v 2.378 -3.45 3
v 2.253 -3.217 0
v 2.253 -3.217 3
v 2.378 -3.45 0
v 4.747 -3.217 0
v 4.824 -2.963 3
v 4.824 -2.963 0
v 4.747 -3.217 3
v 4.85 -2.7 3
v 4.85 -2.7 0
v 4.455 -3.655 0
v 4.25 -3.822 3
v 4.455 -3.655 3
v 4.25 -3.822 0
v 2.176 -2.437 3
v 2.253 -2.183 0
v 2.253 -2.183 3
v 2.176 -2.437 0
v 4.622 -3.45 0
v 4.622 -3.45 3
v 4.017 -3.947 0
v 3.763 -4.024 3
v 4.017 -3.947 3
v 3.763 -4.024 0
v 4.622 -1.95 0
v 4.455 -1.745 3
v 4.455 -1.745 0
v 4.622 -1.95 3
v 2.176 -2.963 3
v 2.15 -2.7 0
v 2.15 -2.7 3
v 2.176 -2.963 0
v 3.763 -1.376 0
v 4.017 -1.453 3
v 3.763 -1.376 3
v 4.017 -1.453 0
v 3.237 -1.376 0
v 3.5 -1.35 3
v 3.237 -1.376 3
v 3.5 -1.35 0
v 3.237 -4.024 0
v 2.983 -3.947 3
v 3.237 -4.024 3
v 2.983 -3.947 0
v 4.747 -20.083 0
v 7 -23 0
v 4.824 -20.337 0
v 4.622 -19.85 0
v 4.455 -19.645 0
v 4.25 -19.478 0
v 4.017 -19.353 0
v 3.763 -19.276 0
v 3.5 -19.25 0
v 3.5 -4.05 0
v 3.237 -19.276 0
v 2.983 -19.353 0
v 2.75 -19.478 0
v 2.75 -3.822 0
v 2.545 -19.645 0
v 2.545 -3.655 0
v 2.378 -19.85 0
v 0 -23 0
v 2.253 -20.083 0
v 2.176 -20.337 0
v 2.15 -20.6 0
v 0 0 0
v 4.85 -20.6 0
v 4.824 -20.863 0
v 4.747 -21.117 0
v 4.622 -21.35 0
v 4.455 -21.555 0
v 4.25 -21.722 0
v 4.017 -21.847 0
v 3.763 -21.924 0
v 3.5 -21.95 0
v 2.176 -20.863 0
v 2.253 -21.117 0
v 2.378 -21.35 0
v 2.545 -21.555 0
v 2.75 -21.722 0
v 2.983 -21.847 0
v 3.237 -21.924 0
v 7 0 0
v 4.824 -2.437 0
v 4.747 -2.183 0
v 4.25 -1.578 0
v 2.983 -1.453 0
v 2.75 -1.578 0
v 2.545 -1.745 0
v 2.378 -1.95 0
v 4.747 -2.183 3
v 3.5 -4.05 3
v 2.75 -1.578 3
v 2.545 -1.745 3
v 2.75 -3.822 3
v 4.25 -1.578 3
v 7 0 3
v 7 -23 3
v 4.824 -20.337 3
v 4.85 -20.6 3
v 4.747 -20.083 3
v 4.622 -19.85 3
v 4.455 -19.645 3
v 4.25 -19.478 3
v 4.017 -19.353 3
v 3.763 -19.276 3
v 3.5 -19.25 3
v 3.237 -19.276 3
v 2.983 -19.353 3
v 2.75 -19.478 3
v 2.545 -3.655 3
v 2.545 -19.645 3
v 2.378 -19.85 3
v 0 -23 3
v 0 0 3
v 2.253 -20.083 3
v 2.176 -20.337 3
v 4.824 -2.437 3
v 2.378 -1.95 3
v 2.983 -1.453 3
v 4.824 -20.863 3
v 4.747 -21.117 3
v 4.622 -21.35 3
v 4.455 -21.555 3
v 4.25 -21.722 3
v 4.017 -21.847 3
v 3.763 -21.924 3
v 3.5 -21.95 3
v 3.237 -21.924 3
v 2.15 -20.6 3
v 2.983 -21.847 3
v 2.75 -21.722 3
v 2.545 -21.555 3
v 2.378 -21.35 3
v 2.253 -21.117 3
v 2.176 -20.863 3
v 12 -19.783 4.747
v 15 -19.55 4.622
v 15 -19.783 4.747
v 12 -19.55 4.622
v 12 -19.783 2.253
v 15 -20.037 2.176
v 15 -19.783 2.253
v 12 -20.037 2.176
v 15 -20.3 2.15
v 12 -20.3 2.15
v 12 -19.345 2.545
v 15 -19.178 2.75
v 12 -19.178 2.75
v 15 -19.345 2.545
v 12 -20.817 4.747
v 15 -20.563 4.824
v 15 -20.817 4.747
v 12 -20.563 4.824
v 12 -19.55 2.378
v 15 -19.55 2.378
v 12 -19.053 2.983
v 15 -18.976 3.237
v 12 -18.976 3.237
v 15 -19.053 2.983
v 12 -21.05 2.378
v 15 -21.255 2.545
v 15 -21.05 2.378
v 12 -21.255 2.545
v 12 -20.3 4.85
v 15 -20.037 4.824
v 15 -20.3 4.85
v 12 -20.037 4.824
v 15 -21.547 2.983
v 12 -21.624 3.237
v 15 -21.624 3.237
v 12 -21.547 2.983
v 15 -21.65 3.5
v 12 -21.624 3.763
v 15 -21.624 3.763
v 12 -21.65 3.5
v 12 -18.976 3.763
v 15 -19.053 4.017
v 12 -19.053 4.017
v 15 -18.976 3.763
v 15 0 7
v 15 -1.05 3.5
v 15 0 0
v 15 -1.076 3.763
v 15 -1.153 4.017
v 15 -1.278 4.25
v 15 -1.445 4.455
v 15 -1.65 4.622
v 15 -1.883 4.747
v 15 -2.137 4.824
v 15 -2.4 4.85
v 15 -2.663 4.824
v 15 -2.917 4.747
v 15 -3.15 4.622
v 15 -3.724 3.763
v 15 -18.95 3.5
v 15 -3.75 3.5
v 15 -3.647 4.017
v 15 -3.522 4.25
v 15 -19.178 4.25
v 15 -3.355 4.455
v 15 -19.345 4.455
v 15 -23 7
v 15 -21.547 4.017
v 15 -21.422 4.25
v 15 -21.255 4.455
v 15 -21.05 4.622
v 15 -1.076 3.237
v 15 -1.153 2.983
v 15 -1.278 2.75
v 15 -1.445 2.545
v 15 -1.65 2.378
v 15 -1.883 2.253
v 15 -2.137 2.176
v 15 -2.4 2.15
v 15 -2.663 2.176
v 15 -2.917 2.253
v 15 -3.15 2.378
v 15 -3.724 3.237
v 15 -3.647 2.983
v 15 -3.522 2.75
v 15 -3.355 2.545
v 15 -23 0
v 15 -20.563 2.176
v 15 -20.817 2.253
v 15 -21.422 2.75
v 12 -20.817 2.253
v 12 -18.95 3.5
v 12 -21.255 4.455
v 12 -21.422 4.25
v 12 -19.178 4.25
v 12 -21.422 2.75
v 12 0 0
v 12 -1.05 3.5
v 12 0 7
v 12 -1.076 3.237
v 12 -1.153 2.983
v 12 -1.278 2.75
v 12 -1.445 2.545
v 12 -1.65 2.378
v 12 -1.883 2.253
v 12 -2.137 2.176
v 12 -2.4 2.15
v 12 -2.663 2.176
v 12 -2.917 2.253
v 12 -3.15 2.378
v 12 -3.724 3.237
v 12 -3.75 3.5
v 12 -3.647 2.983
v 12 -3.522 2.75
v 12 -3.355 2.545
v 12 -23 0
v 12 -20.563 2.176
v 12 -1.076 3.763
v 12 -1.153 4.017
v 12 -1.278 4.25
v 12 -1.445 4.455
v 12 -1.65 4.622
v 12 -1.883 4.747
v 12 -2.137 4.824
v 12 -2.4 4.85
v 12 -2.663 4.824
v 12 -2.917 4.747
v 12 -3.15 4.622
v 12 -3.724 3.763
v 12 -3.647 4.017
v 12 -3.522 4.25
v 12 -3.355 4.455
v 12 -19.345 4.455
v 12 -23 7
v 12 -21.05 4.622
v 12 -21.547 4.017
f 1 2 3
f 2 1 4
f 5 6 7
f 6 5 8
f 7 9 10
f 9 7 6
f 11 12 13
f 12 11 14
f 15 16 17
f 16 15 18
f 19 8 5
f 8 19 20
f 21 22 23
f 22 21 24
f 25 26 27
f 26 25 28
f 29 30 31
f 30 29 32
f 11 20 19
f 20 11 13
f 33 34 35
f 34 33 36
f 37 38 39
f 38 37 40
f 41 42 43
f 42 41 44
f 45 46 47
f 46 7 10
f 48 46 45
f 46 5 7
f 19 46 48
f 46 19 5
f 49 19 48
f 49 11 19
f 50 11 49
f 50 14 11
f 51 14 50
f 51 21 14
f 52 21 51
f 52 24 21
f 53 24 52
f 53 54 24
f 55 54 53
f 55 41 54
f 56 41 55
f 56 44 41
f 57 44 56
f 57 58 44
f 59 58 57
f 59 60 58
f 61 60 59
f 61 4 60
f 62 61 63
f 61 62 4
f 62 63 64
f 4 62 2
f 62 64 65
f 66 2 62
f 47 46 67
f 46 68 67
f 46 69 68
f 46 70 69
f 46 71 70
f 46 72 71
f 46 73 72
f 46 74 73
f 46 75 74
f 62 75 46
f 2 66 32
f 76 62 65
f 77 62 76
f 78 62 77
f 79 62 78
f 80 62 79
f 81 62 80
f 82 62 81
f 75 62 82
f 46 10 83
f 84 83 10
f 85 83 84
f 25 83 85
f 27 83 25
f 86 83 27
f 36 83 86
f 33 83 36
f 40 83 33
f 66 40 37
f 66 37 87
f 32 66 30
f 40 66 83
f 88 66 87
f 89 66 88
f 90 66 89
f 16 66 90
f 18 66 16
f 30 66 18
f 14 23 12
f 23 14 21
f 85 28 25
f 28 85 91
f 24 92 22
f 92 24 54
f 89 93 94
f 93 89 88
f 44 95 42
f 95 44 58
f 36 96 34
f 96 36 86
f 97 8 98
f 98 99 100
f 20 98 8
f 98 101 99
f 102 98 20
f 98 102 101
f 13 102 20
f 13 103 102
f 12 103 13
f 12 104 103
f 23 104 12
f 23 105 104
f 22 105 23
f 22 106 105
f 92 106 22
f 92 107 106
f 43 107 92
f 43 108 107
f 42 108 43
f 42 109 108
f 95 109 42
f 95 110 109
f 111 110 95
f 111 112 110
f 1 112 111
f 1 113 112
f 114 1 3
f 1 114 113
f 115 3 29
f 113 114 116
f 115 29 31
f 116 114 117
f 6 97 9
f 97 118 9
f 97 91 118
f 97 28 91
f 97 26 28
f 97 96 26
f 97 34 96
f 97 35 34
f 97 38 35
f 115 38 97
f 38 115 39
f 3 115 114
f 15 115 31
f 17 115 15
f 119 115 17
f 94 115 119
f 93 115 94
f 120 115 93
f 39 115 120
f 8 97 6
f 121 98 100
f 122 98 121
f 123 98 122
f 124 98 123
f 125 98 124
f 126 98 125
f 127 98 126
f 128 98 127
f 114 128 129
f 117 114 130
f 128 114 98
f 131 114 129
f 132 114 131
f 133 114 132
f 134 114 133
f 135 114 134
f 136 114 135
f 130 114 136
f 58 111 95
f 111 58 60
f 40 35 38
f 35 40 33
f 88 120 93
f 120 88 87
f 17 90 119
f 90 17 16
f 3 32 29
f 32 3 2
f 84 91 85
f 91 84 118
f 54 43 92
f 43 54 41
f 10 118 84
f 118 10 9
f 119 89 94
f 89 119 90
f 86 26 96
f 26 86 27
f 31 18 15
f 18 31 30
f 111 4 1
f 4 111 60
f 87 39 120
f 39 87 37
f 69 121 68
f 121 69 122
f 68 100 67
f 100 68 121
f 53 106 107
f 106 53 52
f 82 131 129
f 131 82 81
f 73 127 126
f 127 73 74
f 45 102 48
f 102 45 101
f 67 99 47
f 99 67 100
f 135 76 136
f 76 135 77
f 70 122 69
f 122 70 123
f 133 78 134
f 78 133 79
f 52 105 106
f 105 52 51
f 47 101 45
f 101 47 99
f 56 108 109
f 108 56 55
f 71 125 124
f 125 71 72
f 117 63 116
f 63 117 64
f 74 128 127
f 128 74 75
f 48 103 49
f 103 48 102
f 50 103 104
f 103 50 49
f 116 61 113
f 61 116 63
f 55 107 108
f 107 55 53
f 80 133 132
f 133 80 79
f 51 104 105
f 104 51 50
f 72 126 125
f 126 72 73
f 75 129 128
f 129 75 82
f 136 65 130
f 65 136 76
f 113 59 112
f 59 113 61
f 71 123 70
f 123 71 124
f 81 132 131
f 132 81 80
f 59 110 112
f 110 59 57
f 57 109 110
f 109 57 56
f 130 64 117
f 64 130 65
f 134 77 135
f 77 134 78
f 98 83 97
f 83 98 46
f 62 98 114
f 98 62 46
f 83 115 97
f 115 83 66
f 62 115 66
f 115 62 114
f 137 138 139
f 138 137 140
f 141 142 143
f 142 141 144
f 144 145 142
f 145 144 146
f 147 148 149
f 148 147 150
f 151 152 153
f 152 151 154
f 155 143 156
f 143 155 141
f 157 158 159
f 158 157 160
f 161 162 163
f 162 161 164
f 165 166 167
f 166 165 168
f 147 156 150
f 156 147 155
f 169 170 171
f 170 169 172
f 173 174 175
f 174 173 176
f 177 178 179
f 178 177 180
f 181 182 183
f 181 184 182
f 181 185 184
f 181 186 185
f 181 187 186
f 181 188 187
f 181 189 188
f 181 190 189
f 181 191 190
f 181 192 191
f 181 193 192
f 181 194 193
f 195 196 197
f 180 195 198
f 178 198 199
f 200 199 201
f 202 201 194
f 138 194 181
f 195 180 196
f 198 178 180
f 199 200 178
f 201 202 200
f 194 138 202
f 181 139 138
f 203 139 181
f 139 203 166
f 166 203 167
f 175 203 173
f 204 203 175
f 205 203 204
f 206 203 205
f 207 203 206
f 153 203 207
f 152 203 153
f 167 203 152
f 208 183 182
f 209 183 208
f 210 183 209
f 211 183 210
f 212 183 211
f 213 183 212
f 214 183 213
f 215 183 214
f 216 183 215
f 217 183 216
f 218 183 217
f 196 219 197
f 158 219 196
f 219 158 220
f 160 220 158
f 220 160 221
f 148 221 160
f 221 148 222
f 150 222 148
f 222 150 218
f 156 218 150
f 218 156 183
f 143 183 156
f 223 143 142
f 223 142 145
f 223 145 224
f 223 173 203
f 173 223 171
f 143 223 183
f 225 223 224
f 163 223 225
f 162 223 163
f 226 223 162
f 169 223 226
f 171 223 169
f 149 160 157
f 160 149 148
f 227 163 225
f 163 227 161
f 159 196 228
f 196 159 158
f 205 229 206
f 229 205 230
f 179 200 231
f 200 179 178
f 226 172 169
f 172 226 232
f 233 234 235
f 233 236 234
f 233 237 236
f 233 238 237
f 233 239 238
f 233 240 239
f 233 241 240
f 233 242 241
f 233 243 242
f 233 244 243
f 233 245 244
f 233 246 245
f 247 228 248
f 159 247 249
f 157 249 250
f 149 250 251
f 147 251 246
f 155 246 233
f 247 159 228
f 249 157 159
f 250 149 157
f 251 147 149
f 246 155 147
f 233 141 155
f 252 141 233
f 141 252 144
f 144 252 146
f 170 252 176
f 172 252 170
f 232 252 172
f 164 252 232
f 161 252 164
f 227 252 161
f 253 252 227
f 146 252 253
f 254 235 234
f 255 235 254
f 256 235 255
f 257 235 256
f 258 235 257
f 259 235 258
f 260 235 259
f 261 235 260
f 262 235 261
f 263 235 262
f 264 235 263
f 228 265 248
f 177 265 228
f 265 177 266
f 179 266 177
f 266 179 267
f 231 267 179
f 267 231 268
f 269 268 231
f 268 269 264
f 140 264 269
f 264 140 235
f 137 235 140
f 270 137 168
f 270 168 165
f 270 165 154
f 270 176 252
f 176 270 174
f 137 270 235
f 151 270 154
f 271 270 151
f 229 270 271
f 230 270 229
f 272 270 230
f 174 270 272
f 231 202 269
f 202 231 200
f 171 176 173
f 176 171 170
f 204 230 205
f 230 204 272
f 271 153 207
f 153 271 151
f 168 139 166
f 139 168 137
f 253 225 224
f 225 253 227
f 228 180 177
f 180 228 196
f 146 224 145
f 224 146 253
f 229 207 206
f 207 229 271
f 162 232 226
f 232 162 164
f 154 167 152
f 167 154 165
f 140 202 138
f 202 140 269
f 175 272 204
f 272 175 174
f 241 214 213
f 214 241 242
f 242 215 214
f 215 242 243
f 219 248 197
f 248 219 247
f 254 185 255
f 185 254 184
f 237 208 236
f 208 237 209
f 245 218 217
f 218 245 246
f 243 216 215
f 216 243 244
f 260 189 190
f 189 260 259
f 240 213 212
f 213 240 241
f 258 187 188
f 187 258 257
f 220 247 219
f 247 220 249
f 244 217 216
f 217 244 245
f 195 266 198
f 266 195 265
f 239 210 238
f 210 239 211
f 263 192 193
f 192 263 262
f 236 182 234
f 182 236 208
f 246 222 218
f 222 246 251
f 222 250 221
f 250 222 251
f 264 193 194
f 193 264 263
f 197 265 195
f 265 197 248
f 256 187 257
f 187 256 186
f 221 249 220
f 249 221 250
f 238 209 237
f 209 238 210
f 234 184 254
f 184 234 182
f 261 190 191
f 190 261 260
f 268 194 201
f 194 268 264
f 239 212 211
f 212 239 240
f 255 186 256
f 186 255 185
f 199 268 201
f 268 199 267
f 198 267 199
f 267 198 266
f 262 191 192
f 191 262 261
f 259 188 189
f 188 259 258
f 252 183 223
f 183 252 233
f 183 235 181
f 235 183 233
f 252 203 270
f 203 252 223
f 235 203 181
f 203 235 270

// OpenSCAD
// file: bot_prototype.scad
m3_d = 2.7;
base_square_size = 100;
motorcase_hole_padding = 17.9;
connector_length = 15;
wall_strength = 5;

module hole_pair(fn=8, padding, diameter, height) {
    rotate([90,0,0]) cylinder(h=height, d=diameter, center=false, $fn=fn);
    translate([0,0,padding]) rotate([90,0,0]) cylinder(h=height, d=diameter, center=false, $fn=fn);
}

module part_bottom_case(fn=8) {
    base_height = 10;
    hole_d = m3_d;
    motor_holder_height = 23;
    
    module raw() {
        cube([
            base_square_size,
            base_square_size,
            base_height
        ]);
        translate([base_square_size/2 - connector_length/2,0,0]){
            cube([connector_length, 
                wall_strength, 
                motor_holder_height
            ]);
        }

        translate([base_square_size/2 - connector_length/2,base_square_size - wall_strength,0]){
            cube([connector_length, 
                wall_strength, 
                motor_holder_height
            ]);
        }

    }

    difference() {
        raw();
        translate([wall_strength, wall_strength, 0]) {
            cube([
                base_square_size - wall_strength * 2,
                base_square_size - wall_strength * 2,
                base_height
            ]);
        }

        translate([base_square_size/2,wall_strength, hole_d])
        hole_pair(fn, motorcase_hole_padding, hole_d, wall_strength);
        translate([base_square_size/2,base_square_size,hole_d])
        hole_pair(fn, motorcase_hole_padding, hole_d, wall_strength);
    }
}

module part_pcb_case(fn=8) {
    pcb_mount_d = 2.7;
    hth_x = 65.5;
    hth_y = 45.5;
    base_height = 2;
    case_holder_height = 25;
    case_hole_padding = 20;
    case_connector_d = m3_d;

    module raw(){
        translate([0,base_square_size/2 - hth_y/2 - pcb_mount_d,0]){
            cube([
                hth_x + pcb_mount_d*2, hth_y + pcb_mount_d*2, base_height
            ]);
        }

        cube([hth_x+pcb_mount_d*2, base_square_size, base_height]);

        translate([base_square_size/2 - connector_length/2,0,0]){
            cube([connector_length, 
                wall_strength, 
                case_holder_height
            ]);
        }

        translate([base_square_size/2 - connector_length/2,base_square_size - wall_strength,0]){
            cube([connector_length, 
                wall_strength, 
                case_holder_height
            ]);
        }
    }

    difference() {
        raw();
        translate([pcb_mount_d*2,wall_strength ,0])
            cube([hth_x-pcb_mount_d*2, base_square_size - wall_strength*2, base_height]);

        translate([pcb_mount_d,base_square_size/2 - hth_y/2 ,0]){
            cylinder(h=base_height, d=pcb_mount_d, center=false, $fn=fn);
            translate([hth_x,0,0])
            cylinder(h=base_height, d=pcb_mount_d, center=false, $fn=fn);
            translate([0,hth_y,0])
            cylinder(h=base_height, d=pcb_mount_d, center=false, $fn=fn);
            translate([hth_x,hth_y,0])
            cylinder(h=base_height, d=pcb_mount_d, center=false, $fn=fn);
        }
        translate([base_square_size/2,wall_strength,(case_holder_height - case_hole_padding)/2])
            hole_pair(fn, case_hole_padding, case_connector_d, wall_strength);
        translate([base_square_size/2,base_square_size,(case_holder_height - case_hole_padding)/2])
            hole_pair(fn, case_hole_padding, case_connector_d, wall_strength);
    }
}

module part_connector(fn=8, strength=3, width=15, length=100, diameter=2.7) {
    difference() {
        cube([width, strength, length]);
        
        translate([width/2 - diameter/2, 0, 23])
        cube([diameter, strength, length - diameter*2-23]);
        
        translate([width/2, strength, diameter])
        hole_pair(fn, motorcase_hole_padding, diameter, strength);
    }
}

module bot_prototype() {
    part_bottom_case(8);

    translate([0,base_square_size,50])
    rotate([180, 0, 0])
    part_pcb_case(8);

    translate([base_square_size/2-15/2,5,0])
    part_connector(8);
    translate([base_square_size/2-15/2,base_square_size-5-3,0])
    part_connector(8);
}

module bot_prototype_print() {
    translate([base_square_size *1.1,0,0])
    part_pcb_case(32);
    
    translate([0,base_square_size *1.1,0])
    part_bottom_case(32);

    translate([base_square_size *1.1,base_square_size *1.1*2,0])
    rotate([90, 0,0])
    part_connector(32);

    translate([base_square_size *1.1 + 30,base_square_size *1.1*2,0])
    rotate([90, 0,0])
    part_connector(32);
}

module bot_prototype_tests() {
    width = 7;
    strength = 3;
    length = 23;
    diameter = m3_d;

    rotate([90,0,0])
    difference() {
        cube([width, strength, length]);
        
        translate([width/2 - diameter/2, 0, 23])
        cube([diameter, strength, length - diameter*2-23]);
        
        translate([width/2, strength, diameter])
        hole_pair(32, motorcase_hole_padding, diameter, strength);
    }

    translate([15,-length,width])
    rotate([0,90, 90])
    difference() {
        cube([width, strength, length]);

        translate([width/2 - diameter/2, 0, 23])
        cube([diameter, strength, length - diameter*2-23]);
        
        translate([width/2, strength, diameter])
        hole_pair(32, motorcase_hole_padding, diameter, strength);
    }
}
// main file
include <bot_prototype.scad>
//include <esp_camera_testkit.scad>


//show_espcam_testkit = false;
show_bot_prototype = false;
show_bot_prototype_print = false;
show_bot_prototype_tests = true;

//if (true == show_espcam_testkit) {
//    top();
//    bottom();
//}

if (true == show_bot_prototype) {
    bot_prototype();
}

if (true == show_bot_prototype_print) {
    bot_prototype_print();
}

if (true == show_bot_prototype_tests) {
    bot_prototype_tests();
}
